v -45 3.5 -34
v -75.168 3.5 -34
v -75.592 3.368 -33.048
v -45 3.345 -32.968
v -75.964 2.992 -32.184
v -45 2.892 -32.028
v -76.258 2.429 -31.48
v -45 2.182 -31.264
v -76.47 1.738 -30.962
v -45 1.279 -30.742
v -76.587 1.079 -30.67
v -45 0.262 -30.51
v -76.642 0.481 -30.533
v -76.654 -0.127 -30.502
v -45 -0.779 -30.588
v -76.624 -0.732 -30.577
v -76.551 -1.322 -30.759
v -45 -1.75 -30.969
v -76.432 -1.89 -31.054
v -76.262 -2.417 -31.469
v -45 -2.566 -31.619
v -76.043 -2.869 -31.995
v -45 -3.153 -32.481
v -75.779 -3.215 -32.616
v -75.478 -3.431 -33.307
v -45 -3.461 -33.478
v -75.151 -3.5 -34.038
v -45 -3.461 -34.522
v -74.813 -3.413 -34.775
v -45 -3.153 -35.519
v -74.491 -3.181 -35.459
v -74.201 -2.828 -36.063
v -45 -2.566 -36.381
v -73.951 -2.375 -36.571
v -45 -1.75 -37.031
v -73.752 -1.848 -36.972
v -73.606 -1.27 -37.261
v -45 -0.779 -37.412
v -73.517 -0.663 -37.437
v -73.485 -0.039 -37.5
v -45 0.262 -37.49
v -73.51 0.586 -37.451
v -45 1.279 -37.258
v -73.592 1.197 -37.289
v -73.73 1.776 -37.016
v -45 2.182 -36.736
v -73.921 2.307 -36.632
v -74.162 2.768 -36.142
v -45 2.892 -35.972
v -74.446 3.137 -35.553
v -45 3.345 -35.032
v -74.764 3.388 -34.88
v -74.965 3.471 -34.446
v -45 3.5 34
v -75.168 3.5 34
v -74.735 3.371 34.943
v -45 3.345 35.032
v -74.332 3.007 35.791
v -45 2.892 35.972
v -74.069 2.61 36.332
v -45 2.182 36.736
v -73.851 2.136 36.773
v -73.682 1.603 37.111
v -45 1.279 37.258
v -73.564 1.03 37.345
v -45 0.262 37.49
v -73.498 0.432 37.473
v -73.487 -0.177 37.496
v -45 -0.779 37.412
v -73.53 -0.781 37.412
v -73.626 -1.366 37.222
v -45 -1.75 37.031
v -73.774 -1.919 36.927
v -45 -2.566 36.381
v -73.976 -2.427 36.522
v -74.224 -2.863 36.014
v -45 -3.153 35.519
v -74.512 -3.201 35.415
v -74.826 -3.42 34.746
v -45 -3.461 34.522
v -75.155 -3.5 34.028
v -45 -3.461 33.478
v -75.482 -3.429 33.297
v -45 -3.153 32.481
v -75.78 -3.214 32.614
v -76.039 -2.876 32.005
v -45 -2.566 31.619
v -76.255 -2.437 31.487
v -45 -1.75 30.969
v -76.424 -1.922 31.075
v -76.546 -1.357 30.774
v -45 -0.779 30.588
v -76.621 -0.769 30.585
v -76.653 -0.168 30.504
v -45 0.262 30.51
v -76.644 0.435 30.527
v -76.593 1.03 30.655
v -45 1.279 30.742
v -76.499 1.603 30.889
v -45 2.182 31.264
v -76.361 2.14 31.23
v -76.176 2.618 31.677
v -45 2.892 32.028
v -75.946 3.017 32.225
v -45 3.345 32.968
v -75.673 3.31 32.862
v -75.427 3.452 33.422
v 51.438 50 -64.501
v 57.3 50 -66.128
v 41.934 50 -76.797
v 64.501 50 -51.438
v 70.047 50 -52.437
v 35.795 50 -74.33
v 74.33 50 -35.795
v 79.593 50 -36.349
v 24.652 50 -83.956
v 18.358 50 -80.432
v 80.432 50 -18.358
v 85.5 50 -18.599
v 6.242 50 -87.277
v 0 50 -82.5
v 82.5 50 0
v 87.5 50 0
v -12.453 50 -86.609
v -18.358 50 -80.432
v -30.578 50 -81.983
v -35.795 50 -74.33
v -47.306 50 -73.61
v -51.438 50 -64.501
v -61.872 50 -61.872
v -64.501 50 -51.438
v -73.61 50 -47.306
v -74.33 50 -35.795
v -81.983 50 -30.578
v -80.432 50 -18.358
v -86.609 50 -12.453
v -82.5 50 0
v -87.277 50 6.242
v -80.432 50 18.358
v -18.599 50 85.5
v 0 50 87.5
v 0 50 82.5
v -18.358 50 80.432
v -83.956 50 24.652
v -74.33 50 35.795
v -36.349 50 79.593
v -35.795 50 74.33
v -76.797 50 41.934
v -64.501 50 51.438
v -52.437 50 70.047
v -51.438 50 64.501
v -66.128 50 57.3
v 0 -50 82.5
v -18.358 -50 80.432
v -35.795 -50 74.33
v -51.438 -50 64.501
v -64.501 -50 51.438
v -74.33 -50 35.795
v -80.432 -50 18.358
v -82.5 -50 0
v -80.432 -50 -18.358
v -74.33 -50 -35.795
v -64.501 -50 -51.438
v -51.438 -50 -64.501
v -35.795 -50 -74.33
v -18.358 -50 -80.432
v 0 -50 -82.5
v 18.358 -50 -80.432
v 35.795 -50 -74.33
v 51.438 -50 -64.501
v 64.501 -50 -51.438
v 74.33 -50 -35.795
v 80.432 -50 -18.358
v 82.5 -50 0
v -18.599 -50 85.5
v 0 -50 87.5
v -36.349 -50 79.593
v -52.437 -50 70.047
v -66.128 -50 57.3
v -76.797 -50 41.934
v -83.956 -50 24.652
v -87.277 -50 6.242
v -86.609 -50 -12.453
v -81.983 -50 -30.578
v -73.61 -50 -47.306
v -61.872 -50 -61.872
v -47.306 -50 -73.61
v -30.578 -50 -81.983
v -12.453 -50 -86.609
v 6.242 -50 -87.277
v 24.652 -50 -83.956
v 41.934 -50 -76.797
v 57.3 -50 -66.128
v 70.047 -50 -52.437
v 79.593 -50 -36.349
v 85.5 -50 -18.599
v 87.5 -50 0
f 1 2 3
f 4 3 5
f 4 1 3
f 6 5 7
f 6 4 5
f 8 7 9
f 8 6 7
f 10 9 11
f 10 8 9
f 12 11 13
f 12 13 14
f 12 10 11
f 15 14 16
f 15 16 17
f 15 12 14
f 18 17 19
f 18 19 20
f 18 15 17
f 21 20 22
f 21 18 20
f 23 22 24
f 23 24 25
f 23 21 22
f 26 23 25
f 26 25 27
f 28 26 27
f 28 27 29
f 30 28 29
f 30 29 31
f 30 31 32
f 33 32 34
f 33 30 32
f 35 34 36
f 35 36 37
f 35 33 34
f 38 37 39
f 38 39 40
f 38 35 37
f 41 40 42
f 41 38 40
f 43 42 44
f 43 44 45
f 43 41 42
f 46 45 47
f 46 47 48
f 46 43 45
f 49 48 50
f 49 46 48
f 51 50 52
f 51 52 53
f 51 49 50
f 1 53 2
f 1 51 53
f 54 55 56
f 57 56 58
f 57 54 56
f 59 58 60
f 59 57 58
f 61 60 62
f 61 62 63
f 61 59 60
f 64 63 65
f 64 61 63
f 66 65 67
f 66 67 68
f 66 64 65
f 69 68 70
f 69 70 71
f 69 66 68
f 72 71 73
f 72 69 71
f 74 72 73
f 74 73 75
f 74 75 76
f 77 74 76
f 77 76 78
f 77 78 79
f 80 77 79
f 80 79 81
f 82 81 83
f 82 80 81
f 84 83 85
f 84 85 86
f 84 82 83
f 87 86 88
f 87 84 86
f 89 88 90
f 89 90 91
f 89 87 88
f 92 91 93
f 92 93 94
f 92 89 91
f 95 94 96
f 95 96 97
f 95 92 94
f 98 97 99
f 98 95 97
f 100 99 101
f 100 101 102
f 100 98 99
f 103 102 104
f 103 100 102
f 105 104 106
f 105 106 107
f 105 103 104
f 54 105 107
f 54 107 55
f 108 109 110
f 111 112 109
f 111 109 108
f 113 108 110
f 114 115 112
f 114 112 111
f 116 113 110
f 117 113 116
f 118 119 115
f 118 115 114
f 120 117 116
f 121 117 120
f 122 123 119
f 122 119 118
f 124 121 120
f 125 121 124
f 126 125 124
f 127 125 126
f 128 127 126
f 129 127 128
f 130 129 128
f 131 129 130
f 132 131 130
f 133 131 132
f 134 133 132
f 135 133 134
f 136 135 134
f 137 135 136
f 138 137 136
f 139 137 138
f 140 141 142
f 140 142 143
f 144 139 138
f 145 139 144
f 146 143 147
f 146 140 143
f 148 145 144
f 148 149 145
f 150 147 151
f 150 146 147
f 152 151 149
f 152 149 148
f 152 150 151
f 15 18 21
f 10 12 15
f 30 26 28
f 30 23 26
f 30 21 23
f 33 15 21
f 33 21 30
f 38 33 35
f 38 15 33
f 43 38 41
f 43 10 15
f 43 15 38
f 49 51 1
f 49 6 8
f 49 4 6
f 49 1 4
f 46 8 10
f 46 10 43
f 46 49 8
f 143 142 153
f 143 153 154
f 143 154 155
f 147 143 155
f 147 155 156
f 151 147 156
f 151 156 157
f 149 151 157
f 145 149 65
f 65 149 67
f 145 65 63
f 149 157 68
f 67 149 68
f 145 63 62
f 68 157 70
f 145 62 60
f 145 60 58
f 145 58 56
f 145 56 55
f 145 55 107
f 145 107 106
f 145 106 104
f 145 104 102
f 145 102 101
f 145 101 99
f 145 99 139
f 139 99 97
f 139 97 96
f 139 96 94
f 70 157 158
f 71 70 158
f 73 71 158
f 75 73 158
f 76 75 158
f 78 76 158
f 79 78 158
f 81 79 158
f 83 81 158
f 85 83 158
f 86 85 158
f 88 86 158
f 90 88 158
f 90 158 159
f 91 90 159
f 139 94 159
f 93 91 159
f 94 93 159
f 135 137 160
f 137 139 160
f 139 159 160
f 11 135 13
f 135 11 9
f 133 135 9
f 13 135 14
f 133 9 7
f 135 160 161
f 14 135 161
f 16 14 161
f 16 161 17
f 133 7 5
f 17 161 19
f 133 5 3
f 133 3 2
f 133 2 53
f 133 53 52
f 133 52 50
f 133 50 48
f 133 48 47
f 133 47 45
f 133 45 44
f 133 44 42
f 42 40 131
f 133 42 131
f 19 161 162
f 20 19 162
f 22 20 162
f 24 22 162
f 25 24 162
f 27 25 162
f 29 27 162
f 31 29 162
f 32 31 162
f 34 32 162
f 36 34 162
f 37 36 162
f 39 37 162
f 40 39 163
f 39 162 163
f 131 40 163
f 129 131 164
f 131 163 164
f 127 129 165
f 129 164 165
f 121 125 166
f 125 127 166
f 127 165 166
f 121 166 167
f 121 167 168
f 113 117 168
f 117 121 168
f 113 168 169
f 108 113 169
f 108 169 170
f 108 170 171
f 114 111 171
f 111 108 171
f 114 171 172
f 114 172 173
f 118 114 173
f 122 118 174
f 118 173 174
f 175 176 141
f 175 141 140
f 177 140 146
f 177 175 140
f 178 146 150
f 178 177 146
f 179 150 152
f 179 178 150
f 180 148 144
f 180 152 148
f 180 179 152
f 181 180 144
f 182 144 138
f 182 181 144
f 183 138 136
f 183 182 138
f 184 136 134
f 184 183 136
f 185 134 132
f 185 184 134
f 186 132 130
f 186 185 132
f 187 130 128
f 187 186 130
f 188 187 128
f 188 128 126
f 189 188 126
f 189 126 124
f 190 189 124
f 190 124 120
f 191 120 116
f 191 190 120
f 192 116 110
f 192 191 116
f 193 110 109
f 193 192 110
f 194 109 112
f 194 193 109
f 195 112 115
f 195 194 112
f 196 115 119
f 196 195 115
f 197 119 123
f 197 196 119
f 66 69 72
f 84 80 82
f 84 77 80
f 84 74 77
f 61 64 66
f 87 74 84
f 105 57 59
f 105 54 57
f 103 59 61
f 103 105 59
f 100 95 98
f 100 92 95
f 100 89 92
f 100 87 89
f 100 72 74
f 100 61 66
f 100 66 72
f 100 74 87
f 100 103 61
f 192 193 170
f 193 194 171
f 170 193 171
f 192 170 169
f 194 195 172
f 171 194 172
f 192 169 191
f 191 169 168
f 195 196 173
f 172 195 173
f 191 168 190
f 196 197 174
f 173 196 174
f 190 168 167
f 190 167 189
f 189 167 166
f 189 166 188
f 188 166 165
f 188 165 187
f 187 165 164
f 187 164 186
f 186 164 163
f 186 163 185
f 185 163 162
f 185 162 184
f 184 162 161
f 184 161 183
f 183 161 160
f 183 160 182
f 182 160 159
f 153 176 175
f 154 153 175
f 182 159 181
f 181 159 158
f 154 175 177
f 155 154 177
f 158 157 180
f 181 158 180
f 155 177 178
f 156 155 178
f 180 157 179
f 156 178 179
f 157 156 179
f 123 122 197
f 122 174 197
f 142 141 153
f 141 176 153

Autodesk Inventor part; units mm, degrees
ref_plane "YZ Plane" through (0, 0, 0) normal (1, 0, 0) x (0, 1, 0)
ref_plane "XZ Plane" through (0, 0, 0) normal (0, 1, 0) x (-1, 0, 0)
ref_plane "XY Plane" through (0, 0, 0) normal (0, 0, 1) x (1, 0, 0)
sketch "Sketch1" plane through (0, 0, 0) normal (0, 1, 0) x (-1, 0, 0)
  arc A0 (-87.5, 0) -> (0, 87.5) centre (0, 0) ccw
  arc A1 (-82.5, 0) -> (0, 82.5) centre (0, 0) ccw
  line L0 (0, 87.5) -> (0, 82.5)
  line L1 (-82.5, 0) -> (-87.5, 0)
  dimension "d0" = 165
  dimension "d1" = 175
  dimension "d7" = 0
  dimension "d8" = 0
extrude "Extrusion1" add sketch "Sketch1" along normal mid plane 100
sketch "Sketch3" plane through (0, 0, 0) normal (1, 0, 0) x (0, 1, 0)
  circle A0 centre (0, 34) radius 3.5
  circle A1 centre (0, -34) radius 3.5
  circle A2 centre (0, 34) radius 3.5
  circle A3 centre (0, -34) radius 3.5
  point P0 (0, 0)
  dimension "d9" = 7
  dimension "d10" = 7
  dimension "d11" = 68
  dimension "d12" = 34
  dimension "d13" = 34
extrude "Extrusion2" add sketch "Sketch3" against normal up to next
sketch "Sketch4" plane through (0, 0, 34) normal (1, 0, 0) x (0, 0, -1)
  circle A0 centre (0, 0) radius 3.5
  circle A1 centre (68, 0) radius 3.5 projected
  circle A2 centre (68, 0) radius 3.5
  point P0 (34, 0)
extrude "Extrusion3" cut sketch "Sketch4" against normal blind 45
properties part number "airframe"
